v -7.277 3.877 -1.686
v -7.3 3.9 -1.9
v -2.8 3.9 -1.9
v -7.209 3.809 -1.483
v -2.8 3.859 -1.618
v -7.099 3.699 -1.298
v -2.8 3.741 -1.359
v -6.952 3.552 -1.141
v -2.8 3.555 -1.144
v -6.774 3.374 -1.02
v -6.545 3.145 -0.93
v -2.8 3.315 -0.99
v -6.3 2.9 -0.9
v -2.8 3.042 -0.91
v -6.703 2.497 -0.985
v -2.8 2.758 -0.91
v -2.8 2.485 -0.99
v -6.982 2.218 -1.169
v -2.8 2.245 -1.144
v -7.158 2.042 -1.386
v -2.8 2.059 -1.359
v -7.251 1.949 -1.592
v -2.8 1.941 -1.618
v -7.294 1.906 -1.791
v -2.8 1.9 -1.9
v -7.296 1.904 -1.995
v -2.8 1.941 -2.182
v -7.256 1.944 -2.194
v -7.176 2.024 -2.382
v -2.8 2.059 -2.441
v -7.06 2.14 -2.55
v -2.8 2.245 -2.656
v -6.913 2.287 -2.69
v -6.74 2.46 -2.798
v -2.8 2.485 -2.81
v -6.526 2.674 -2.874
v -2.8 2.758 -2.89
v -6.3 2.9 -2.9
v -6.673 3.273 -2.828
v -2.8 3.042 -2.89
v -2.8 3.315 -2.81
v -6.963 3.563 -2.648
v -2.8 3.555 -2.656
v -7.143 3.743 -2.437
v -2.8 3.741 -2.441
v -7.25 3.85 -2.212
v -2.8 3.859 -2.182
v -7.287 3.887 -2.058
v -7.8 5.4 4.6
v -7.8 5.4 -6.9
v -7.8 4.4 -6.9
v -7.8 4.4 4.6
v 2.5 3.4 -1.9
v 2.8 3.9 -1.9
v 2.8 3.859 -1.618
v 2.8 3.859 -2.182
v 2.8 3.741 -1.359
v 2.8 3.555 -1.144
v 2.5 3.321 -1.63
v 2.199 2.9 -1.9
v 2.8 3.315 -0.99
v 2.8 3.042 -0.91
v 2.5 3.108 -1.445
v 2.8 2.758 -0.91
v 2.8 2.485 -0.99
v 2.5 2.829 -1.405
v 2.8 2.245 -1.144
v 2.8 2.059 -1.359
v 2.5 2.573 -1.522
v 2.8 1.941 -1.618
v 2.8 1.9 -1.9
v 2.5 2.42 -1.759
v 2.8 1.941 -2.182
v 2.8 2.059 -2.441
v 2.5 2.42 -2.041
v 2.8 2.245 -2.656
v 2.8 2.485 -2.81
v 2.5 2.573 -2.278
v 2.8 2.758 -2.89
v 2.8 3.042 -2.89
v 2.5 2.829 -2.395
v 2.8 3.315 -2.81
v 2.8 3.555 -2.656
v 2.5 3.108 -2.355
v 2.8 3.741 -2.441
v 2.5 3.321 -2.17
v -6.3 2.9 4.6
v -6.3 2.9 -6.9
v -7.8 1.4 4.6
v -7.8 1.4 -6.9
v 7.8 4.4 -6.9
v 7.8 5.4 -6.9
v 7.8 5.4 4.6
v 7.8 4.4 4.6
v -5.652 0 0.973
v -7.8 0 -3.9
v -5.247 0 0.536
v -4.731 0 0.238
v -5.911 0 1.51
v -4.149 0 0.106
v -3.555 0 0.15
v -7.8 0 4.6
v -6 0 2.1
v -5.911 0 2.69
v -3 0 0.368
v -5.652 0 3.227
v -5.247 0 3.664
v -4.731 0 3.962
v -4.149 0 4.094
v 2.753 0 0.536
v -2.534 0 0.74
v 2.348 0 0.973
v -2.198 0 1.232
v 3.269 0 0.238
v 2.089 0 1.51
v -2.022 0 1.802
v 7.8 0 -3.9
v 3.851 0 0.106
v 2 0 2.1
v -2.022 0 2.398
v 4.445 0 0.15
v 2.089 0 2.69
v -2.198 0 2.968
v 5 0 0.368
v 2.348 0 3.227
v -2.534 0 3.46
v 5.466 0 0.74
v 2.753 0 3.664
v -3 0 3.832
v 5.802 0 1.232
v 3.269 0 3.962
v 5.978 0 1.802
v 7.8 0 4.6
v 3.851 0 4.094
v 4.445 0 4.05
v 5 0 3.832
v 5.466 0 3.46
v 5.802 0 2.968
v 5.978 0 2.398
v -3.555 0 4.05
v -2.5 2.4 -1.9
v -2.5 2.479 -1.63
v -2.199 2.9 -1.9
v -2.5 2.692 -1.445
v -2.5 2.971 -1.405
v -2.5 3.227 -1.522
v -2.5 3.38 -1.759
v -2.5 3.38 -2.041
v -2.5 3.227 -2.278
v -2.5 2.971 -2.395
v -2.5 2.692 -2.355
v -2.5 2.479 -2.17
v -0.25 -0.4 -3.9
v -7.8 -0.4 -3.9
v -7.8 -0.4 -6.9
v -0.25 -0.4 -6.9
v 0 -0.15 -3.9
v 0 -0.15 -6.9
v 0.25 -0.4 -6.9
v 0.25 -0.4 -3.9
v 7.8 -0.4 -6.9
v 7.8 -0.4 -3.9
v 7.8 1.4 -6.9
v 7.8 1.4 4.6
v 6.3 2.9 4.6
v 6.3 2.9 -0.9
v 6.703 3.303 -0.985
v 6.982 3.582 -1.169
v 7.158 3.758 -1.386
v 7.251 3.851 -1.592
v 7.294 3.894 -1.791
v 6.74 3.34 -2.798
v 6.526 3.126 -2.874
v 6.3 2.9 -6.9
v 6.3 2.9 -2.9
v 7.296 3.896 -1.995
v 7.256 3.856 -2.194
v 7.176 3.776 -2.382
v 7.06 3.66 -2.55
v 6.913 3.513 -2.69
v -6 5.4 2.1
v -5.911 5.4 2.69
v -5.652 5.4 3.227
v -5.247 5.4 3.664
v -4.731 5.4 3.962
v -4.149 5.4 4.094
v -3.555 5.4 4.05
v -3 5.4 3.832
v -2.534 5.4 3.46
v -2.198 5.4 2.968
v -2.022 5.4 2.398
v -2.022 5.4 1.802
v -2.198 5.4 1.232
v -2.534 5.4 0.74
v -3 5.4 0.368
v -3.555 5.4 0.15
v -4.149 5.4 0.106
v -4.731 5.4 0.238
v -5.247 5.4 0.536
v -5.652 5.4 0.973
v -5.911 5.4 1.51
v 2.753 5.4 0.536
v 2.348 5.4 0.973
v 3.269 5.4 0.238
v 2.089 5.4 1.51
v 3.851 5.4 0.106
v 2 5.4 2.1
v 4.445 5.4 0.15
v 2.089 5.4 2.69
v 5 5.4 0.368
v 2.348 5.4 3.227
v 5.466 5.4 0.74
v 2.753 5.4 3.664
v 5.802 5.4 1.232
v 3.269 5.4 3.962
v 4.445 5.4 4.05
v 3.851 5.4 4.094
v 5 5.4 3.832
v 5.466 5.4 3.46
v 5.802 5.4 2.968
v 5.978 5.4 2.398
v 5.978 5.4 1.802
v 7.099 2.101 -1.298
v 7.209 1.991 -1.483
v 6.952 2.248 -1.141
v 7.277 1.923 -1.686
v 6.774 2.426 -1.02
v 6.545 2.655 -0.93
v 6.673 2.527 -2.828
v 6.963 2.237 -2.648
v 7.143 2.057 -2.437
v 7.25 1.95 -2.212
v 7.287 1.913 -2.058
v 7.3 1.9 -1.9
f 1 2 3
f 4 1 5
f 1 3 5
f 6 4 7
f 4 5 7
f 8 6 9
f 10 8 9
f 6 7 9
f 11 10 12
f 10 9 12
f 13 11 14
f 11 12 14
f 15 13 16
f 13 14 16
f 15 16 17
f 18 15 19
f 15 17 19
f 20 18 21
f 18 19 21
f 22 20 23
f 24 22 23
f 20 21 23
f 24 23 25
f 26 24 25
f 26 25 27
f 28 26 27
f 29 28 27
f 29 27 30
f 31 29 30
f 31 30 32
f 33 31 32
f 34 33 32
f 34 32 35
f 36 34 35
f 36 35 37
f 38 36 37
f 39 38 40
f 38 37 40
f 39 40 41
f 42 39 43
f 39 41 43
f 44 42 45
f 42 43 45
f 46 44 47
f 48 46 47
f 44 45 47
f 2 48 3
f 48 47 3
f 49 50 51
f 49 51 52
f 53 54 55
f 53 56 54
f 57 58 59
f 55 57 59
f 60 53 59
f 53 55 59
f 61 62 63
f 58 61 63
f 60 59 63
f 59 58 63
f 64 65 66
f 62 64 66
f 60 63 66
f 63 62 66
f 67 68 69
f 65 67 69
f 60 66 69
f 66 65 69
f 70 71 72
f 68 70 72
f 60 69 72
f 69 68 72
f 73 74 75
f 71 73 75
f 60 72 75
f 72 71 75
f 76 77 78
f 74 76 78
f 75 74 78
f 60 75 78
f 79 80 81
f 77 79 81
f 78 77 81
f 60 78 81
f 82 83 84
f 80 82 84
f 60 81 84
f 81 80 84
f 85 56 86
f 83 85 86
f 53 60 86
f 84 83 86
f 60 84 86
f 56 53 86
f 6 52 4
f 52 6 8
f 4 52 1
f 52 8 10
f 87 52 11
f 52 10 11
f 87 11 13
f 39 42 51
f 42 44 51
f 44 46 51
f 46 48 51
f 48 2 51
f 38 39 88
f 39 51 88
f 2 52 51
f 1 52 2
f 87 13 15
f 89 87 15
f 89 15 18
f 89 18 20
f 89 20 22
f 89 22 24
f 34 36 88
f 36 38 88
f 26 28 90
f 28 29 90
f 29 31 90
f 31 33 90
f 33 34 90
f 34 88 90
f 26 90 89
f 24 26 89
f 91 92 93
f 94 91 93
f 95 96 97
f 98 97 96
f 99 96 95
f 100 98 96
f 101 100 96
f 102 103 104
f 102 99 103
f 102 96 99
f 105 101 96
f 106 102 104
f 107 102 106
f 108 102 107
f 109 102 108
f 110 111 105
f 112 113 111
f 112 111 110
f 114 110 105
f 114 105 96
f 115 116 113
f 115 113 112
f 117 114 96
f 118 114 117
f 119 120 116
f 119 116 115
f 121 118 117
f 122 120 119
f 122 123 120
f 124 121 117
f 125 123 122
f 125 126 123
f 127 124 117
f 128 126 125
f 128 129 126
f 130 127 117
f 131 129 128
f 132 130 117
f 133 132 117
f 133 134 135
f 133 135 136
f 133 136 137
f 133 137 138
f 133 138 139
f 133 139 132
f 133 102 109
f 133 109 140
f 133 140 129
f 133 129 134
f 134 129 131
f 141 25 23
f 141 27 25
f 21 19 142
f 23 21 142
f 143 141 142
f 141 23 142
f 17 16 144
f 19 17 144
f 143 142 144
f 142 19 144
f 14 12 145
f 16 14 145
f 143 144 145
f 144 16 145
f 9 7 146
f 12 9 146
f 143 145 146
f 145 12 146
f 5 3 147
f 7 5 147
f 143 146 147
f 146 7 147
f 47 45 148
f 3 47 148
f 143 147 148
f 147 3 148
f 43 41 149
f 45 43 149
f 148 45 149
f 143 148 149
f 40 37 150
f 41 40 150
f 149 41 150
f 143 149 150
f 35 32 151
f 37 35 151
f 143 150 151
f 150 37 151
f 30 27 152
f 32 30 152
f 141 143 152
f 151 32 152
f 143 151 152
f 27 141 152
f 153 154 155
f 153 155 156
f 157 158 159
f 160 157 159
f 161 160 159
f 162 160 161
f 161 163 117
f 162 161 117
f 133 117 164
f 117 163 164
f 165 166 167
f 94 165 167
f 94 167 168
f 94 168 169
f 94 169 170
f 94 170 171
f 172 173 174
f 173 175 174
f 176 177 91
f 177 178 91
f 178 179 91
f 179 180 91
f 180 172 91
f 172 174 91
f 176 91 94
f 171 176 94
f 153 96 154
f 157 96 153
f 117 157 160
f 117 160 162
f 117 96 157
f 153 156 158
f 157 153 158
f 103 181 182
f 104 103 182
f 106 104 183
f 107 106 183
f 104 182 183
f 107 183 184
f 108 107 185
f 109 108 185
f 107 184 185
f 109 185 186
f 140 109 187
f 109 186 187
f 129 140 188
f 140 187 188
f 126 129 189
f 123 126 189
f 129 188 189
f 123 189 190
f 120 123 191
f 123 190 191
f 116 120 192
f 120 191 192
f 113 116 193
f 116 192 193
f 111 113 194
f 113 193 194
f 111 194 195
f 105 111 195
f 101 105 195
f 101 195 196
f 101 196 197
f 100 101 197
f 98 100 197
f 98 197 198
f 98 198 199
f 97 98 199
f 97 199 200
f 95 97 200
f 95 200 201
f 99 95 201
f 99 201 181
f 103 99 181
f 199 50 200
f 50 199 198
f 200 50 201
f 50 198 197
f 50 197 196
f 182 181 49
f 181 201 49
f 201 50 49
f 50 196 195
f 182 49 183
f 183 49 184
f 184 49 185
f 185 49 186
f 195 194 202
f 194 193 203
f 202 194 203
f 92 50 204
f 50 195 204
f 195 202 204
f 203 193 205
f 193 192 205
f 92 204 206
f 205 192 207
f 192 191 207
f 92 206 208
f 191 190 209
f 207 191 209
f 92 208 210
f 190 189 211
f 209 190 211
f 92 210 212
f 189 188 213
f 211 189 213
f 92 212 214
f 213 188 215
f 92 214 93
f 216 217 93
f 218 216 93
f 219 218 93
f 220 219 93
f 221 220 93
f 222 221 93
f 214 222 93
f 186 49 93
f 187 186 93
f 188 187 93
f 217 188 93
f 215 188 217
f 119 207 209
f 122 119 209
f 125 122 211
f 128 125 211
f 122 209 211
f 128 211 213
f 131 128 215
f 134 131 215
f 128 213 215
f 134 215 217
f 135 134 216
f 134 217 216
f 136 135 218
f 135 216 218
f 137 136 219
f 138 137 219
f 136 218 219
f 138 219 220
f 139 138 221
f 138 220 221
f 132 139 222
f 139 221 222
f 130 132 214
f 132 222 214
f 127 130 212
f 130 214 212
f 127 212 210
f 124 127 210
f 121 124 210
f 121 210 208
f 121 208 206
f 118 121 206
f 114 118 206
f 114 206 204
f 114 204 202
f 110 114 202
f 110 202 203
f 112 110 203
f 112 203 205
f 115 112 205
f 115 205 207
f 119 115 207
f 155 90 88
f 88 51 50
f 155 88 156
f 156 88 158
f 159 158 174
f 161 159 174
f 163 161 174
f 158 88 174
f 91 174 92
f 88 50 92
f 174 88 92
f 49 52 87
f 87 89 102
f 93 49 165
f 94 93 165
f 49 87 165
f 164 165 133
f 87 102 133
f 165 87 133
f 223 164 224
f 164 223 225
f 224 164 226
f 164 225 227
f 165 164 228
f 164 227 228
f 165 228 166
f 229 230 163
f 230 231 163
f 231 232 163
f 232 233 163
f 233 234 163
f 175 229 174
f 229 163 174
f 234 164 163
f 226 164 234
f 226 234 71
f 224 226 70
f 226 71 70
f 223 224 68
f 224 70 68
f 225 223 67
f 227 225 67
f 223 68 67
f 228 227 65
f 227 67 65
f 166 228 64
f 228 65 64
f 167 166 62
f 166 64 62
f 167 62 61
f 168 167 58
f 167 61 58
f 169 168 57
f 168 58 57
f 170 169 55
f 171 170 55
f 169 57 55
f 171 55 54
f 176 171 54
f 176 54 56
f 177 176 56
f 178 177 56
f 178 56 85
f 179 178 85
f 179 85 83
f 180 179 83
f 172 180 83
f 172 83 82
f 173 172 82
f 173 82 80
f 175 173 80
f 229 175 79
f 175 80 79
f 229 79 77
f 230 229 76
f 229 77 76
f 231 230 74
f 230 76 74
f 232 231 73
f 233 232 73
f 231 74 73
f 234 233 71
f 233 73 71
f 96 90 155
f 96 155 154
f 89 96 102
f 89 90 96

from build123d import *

# Parameters (mm, degrees)
F0_W           = 15.6
F0_H           = 11.5
F1_DEPTH       = 5.4
F2_W           = 15.6
F2_H           = 3
F3_DEPTH       = 0.4
F6_D           = 2
F6_DEPTH       = 5
F6_TIP         = 0.600860619
F6_ON_F5_D     = 2
F6_ON_F5_DEPTH = 5
F6_ON_F5_TIP   = 0.600860619
F8_DEPTH       = 25
F10_DEPTH      = 3
F12_D          = 4


with BuildPart() as f1:
    # F0 (on Front) → F1 (new body)
    with BuildSketch(Plane.XZ):
        with Locations((0, -1.15)):
            Rectangle(F0_W, F0_H)
    extrude(amount=-F1_DEPTH)

    # F2 (on face) → F3 (join)
    with BuildSketch(Plane.XZ):
        with Locations((0, -5.4)):
            Rectangle(F2_W, F2_H)
    extrude(amount=F3_DEPTH)

    # F6
    with Locations(Plane.YZ.offset(7.8)):
        with Locations((2.9, -1.9)):
            Hole(F6_D / 2, depth=F6_DEPTH)
            with Locations((0, 0, -(F6_DEPTH + F6_TIP / 2))):  # 118° drill point
                Cone(0, F6_D / 2, F6_TIP, mode=Mode.SUBTRACT)

    # F6 on F5
    with Locations(Plane(origin=(-7.8, 0, 0), x_dir=(0, -1, 0), z_dir=(-1, 0, 0))):
        with Locations((-2.9, -1.9)):
            Hole(F6_ON_F5_D / 2, depth=F6_ON_F5_DEPTH)
            with Locations((0, 0, -(F6_ON_F5_DEPTH + F6_ON_F5_TIP / 2))):  # 118° drill point
                Cone(0, F6_ON_F5_D / 2, F6_ON_F5_TIP, mode=Mode.SUBTRACT)

    # F7 (on face) → F8 (cut)
    with BuildSketch(Plane(origin=(0, 0, -6.9), x_dir=(1, 0, 0), z_dir=(0, 0, -1))):
        Polygon((-6.3, -2.9), (-7.8, -1.4), (-7.8, -4.4), align=None)
        Polygon((7.8, -4.4), (7.8, -1.4), (6.3, -2.9), align=None)
    extrude(amount=-F8_DEPTH, mode=Mode.SUBTRACT)

    # F9 (on face) → F10 (cut, through all)
    with BuildSketch(Plane(origin=(0, 0, -6.9), x_dir=(1, 0, 0), z_dir=(0, 0, -1))):
        Polygon((-0.25, 0.4), (0, 0.15), (0.25, 0.4), align=None)
    extrude(amount=-F10_DEPTH, mode=Mode.SUBTRACT)

    # F12 (through all)
    with Locations(Plane.XZ):
        with Locations((-4, 2.1), (4, 2.1)):
            Hole(F12_D / 2)


solid = f1.part
